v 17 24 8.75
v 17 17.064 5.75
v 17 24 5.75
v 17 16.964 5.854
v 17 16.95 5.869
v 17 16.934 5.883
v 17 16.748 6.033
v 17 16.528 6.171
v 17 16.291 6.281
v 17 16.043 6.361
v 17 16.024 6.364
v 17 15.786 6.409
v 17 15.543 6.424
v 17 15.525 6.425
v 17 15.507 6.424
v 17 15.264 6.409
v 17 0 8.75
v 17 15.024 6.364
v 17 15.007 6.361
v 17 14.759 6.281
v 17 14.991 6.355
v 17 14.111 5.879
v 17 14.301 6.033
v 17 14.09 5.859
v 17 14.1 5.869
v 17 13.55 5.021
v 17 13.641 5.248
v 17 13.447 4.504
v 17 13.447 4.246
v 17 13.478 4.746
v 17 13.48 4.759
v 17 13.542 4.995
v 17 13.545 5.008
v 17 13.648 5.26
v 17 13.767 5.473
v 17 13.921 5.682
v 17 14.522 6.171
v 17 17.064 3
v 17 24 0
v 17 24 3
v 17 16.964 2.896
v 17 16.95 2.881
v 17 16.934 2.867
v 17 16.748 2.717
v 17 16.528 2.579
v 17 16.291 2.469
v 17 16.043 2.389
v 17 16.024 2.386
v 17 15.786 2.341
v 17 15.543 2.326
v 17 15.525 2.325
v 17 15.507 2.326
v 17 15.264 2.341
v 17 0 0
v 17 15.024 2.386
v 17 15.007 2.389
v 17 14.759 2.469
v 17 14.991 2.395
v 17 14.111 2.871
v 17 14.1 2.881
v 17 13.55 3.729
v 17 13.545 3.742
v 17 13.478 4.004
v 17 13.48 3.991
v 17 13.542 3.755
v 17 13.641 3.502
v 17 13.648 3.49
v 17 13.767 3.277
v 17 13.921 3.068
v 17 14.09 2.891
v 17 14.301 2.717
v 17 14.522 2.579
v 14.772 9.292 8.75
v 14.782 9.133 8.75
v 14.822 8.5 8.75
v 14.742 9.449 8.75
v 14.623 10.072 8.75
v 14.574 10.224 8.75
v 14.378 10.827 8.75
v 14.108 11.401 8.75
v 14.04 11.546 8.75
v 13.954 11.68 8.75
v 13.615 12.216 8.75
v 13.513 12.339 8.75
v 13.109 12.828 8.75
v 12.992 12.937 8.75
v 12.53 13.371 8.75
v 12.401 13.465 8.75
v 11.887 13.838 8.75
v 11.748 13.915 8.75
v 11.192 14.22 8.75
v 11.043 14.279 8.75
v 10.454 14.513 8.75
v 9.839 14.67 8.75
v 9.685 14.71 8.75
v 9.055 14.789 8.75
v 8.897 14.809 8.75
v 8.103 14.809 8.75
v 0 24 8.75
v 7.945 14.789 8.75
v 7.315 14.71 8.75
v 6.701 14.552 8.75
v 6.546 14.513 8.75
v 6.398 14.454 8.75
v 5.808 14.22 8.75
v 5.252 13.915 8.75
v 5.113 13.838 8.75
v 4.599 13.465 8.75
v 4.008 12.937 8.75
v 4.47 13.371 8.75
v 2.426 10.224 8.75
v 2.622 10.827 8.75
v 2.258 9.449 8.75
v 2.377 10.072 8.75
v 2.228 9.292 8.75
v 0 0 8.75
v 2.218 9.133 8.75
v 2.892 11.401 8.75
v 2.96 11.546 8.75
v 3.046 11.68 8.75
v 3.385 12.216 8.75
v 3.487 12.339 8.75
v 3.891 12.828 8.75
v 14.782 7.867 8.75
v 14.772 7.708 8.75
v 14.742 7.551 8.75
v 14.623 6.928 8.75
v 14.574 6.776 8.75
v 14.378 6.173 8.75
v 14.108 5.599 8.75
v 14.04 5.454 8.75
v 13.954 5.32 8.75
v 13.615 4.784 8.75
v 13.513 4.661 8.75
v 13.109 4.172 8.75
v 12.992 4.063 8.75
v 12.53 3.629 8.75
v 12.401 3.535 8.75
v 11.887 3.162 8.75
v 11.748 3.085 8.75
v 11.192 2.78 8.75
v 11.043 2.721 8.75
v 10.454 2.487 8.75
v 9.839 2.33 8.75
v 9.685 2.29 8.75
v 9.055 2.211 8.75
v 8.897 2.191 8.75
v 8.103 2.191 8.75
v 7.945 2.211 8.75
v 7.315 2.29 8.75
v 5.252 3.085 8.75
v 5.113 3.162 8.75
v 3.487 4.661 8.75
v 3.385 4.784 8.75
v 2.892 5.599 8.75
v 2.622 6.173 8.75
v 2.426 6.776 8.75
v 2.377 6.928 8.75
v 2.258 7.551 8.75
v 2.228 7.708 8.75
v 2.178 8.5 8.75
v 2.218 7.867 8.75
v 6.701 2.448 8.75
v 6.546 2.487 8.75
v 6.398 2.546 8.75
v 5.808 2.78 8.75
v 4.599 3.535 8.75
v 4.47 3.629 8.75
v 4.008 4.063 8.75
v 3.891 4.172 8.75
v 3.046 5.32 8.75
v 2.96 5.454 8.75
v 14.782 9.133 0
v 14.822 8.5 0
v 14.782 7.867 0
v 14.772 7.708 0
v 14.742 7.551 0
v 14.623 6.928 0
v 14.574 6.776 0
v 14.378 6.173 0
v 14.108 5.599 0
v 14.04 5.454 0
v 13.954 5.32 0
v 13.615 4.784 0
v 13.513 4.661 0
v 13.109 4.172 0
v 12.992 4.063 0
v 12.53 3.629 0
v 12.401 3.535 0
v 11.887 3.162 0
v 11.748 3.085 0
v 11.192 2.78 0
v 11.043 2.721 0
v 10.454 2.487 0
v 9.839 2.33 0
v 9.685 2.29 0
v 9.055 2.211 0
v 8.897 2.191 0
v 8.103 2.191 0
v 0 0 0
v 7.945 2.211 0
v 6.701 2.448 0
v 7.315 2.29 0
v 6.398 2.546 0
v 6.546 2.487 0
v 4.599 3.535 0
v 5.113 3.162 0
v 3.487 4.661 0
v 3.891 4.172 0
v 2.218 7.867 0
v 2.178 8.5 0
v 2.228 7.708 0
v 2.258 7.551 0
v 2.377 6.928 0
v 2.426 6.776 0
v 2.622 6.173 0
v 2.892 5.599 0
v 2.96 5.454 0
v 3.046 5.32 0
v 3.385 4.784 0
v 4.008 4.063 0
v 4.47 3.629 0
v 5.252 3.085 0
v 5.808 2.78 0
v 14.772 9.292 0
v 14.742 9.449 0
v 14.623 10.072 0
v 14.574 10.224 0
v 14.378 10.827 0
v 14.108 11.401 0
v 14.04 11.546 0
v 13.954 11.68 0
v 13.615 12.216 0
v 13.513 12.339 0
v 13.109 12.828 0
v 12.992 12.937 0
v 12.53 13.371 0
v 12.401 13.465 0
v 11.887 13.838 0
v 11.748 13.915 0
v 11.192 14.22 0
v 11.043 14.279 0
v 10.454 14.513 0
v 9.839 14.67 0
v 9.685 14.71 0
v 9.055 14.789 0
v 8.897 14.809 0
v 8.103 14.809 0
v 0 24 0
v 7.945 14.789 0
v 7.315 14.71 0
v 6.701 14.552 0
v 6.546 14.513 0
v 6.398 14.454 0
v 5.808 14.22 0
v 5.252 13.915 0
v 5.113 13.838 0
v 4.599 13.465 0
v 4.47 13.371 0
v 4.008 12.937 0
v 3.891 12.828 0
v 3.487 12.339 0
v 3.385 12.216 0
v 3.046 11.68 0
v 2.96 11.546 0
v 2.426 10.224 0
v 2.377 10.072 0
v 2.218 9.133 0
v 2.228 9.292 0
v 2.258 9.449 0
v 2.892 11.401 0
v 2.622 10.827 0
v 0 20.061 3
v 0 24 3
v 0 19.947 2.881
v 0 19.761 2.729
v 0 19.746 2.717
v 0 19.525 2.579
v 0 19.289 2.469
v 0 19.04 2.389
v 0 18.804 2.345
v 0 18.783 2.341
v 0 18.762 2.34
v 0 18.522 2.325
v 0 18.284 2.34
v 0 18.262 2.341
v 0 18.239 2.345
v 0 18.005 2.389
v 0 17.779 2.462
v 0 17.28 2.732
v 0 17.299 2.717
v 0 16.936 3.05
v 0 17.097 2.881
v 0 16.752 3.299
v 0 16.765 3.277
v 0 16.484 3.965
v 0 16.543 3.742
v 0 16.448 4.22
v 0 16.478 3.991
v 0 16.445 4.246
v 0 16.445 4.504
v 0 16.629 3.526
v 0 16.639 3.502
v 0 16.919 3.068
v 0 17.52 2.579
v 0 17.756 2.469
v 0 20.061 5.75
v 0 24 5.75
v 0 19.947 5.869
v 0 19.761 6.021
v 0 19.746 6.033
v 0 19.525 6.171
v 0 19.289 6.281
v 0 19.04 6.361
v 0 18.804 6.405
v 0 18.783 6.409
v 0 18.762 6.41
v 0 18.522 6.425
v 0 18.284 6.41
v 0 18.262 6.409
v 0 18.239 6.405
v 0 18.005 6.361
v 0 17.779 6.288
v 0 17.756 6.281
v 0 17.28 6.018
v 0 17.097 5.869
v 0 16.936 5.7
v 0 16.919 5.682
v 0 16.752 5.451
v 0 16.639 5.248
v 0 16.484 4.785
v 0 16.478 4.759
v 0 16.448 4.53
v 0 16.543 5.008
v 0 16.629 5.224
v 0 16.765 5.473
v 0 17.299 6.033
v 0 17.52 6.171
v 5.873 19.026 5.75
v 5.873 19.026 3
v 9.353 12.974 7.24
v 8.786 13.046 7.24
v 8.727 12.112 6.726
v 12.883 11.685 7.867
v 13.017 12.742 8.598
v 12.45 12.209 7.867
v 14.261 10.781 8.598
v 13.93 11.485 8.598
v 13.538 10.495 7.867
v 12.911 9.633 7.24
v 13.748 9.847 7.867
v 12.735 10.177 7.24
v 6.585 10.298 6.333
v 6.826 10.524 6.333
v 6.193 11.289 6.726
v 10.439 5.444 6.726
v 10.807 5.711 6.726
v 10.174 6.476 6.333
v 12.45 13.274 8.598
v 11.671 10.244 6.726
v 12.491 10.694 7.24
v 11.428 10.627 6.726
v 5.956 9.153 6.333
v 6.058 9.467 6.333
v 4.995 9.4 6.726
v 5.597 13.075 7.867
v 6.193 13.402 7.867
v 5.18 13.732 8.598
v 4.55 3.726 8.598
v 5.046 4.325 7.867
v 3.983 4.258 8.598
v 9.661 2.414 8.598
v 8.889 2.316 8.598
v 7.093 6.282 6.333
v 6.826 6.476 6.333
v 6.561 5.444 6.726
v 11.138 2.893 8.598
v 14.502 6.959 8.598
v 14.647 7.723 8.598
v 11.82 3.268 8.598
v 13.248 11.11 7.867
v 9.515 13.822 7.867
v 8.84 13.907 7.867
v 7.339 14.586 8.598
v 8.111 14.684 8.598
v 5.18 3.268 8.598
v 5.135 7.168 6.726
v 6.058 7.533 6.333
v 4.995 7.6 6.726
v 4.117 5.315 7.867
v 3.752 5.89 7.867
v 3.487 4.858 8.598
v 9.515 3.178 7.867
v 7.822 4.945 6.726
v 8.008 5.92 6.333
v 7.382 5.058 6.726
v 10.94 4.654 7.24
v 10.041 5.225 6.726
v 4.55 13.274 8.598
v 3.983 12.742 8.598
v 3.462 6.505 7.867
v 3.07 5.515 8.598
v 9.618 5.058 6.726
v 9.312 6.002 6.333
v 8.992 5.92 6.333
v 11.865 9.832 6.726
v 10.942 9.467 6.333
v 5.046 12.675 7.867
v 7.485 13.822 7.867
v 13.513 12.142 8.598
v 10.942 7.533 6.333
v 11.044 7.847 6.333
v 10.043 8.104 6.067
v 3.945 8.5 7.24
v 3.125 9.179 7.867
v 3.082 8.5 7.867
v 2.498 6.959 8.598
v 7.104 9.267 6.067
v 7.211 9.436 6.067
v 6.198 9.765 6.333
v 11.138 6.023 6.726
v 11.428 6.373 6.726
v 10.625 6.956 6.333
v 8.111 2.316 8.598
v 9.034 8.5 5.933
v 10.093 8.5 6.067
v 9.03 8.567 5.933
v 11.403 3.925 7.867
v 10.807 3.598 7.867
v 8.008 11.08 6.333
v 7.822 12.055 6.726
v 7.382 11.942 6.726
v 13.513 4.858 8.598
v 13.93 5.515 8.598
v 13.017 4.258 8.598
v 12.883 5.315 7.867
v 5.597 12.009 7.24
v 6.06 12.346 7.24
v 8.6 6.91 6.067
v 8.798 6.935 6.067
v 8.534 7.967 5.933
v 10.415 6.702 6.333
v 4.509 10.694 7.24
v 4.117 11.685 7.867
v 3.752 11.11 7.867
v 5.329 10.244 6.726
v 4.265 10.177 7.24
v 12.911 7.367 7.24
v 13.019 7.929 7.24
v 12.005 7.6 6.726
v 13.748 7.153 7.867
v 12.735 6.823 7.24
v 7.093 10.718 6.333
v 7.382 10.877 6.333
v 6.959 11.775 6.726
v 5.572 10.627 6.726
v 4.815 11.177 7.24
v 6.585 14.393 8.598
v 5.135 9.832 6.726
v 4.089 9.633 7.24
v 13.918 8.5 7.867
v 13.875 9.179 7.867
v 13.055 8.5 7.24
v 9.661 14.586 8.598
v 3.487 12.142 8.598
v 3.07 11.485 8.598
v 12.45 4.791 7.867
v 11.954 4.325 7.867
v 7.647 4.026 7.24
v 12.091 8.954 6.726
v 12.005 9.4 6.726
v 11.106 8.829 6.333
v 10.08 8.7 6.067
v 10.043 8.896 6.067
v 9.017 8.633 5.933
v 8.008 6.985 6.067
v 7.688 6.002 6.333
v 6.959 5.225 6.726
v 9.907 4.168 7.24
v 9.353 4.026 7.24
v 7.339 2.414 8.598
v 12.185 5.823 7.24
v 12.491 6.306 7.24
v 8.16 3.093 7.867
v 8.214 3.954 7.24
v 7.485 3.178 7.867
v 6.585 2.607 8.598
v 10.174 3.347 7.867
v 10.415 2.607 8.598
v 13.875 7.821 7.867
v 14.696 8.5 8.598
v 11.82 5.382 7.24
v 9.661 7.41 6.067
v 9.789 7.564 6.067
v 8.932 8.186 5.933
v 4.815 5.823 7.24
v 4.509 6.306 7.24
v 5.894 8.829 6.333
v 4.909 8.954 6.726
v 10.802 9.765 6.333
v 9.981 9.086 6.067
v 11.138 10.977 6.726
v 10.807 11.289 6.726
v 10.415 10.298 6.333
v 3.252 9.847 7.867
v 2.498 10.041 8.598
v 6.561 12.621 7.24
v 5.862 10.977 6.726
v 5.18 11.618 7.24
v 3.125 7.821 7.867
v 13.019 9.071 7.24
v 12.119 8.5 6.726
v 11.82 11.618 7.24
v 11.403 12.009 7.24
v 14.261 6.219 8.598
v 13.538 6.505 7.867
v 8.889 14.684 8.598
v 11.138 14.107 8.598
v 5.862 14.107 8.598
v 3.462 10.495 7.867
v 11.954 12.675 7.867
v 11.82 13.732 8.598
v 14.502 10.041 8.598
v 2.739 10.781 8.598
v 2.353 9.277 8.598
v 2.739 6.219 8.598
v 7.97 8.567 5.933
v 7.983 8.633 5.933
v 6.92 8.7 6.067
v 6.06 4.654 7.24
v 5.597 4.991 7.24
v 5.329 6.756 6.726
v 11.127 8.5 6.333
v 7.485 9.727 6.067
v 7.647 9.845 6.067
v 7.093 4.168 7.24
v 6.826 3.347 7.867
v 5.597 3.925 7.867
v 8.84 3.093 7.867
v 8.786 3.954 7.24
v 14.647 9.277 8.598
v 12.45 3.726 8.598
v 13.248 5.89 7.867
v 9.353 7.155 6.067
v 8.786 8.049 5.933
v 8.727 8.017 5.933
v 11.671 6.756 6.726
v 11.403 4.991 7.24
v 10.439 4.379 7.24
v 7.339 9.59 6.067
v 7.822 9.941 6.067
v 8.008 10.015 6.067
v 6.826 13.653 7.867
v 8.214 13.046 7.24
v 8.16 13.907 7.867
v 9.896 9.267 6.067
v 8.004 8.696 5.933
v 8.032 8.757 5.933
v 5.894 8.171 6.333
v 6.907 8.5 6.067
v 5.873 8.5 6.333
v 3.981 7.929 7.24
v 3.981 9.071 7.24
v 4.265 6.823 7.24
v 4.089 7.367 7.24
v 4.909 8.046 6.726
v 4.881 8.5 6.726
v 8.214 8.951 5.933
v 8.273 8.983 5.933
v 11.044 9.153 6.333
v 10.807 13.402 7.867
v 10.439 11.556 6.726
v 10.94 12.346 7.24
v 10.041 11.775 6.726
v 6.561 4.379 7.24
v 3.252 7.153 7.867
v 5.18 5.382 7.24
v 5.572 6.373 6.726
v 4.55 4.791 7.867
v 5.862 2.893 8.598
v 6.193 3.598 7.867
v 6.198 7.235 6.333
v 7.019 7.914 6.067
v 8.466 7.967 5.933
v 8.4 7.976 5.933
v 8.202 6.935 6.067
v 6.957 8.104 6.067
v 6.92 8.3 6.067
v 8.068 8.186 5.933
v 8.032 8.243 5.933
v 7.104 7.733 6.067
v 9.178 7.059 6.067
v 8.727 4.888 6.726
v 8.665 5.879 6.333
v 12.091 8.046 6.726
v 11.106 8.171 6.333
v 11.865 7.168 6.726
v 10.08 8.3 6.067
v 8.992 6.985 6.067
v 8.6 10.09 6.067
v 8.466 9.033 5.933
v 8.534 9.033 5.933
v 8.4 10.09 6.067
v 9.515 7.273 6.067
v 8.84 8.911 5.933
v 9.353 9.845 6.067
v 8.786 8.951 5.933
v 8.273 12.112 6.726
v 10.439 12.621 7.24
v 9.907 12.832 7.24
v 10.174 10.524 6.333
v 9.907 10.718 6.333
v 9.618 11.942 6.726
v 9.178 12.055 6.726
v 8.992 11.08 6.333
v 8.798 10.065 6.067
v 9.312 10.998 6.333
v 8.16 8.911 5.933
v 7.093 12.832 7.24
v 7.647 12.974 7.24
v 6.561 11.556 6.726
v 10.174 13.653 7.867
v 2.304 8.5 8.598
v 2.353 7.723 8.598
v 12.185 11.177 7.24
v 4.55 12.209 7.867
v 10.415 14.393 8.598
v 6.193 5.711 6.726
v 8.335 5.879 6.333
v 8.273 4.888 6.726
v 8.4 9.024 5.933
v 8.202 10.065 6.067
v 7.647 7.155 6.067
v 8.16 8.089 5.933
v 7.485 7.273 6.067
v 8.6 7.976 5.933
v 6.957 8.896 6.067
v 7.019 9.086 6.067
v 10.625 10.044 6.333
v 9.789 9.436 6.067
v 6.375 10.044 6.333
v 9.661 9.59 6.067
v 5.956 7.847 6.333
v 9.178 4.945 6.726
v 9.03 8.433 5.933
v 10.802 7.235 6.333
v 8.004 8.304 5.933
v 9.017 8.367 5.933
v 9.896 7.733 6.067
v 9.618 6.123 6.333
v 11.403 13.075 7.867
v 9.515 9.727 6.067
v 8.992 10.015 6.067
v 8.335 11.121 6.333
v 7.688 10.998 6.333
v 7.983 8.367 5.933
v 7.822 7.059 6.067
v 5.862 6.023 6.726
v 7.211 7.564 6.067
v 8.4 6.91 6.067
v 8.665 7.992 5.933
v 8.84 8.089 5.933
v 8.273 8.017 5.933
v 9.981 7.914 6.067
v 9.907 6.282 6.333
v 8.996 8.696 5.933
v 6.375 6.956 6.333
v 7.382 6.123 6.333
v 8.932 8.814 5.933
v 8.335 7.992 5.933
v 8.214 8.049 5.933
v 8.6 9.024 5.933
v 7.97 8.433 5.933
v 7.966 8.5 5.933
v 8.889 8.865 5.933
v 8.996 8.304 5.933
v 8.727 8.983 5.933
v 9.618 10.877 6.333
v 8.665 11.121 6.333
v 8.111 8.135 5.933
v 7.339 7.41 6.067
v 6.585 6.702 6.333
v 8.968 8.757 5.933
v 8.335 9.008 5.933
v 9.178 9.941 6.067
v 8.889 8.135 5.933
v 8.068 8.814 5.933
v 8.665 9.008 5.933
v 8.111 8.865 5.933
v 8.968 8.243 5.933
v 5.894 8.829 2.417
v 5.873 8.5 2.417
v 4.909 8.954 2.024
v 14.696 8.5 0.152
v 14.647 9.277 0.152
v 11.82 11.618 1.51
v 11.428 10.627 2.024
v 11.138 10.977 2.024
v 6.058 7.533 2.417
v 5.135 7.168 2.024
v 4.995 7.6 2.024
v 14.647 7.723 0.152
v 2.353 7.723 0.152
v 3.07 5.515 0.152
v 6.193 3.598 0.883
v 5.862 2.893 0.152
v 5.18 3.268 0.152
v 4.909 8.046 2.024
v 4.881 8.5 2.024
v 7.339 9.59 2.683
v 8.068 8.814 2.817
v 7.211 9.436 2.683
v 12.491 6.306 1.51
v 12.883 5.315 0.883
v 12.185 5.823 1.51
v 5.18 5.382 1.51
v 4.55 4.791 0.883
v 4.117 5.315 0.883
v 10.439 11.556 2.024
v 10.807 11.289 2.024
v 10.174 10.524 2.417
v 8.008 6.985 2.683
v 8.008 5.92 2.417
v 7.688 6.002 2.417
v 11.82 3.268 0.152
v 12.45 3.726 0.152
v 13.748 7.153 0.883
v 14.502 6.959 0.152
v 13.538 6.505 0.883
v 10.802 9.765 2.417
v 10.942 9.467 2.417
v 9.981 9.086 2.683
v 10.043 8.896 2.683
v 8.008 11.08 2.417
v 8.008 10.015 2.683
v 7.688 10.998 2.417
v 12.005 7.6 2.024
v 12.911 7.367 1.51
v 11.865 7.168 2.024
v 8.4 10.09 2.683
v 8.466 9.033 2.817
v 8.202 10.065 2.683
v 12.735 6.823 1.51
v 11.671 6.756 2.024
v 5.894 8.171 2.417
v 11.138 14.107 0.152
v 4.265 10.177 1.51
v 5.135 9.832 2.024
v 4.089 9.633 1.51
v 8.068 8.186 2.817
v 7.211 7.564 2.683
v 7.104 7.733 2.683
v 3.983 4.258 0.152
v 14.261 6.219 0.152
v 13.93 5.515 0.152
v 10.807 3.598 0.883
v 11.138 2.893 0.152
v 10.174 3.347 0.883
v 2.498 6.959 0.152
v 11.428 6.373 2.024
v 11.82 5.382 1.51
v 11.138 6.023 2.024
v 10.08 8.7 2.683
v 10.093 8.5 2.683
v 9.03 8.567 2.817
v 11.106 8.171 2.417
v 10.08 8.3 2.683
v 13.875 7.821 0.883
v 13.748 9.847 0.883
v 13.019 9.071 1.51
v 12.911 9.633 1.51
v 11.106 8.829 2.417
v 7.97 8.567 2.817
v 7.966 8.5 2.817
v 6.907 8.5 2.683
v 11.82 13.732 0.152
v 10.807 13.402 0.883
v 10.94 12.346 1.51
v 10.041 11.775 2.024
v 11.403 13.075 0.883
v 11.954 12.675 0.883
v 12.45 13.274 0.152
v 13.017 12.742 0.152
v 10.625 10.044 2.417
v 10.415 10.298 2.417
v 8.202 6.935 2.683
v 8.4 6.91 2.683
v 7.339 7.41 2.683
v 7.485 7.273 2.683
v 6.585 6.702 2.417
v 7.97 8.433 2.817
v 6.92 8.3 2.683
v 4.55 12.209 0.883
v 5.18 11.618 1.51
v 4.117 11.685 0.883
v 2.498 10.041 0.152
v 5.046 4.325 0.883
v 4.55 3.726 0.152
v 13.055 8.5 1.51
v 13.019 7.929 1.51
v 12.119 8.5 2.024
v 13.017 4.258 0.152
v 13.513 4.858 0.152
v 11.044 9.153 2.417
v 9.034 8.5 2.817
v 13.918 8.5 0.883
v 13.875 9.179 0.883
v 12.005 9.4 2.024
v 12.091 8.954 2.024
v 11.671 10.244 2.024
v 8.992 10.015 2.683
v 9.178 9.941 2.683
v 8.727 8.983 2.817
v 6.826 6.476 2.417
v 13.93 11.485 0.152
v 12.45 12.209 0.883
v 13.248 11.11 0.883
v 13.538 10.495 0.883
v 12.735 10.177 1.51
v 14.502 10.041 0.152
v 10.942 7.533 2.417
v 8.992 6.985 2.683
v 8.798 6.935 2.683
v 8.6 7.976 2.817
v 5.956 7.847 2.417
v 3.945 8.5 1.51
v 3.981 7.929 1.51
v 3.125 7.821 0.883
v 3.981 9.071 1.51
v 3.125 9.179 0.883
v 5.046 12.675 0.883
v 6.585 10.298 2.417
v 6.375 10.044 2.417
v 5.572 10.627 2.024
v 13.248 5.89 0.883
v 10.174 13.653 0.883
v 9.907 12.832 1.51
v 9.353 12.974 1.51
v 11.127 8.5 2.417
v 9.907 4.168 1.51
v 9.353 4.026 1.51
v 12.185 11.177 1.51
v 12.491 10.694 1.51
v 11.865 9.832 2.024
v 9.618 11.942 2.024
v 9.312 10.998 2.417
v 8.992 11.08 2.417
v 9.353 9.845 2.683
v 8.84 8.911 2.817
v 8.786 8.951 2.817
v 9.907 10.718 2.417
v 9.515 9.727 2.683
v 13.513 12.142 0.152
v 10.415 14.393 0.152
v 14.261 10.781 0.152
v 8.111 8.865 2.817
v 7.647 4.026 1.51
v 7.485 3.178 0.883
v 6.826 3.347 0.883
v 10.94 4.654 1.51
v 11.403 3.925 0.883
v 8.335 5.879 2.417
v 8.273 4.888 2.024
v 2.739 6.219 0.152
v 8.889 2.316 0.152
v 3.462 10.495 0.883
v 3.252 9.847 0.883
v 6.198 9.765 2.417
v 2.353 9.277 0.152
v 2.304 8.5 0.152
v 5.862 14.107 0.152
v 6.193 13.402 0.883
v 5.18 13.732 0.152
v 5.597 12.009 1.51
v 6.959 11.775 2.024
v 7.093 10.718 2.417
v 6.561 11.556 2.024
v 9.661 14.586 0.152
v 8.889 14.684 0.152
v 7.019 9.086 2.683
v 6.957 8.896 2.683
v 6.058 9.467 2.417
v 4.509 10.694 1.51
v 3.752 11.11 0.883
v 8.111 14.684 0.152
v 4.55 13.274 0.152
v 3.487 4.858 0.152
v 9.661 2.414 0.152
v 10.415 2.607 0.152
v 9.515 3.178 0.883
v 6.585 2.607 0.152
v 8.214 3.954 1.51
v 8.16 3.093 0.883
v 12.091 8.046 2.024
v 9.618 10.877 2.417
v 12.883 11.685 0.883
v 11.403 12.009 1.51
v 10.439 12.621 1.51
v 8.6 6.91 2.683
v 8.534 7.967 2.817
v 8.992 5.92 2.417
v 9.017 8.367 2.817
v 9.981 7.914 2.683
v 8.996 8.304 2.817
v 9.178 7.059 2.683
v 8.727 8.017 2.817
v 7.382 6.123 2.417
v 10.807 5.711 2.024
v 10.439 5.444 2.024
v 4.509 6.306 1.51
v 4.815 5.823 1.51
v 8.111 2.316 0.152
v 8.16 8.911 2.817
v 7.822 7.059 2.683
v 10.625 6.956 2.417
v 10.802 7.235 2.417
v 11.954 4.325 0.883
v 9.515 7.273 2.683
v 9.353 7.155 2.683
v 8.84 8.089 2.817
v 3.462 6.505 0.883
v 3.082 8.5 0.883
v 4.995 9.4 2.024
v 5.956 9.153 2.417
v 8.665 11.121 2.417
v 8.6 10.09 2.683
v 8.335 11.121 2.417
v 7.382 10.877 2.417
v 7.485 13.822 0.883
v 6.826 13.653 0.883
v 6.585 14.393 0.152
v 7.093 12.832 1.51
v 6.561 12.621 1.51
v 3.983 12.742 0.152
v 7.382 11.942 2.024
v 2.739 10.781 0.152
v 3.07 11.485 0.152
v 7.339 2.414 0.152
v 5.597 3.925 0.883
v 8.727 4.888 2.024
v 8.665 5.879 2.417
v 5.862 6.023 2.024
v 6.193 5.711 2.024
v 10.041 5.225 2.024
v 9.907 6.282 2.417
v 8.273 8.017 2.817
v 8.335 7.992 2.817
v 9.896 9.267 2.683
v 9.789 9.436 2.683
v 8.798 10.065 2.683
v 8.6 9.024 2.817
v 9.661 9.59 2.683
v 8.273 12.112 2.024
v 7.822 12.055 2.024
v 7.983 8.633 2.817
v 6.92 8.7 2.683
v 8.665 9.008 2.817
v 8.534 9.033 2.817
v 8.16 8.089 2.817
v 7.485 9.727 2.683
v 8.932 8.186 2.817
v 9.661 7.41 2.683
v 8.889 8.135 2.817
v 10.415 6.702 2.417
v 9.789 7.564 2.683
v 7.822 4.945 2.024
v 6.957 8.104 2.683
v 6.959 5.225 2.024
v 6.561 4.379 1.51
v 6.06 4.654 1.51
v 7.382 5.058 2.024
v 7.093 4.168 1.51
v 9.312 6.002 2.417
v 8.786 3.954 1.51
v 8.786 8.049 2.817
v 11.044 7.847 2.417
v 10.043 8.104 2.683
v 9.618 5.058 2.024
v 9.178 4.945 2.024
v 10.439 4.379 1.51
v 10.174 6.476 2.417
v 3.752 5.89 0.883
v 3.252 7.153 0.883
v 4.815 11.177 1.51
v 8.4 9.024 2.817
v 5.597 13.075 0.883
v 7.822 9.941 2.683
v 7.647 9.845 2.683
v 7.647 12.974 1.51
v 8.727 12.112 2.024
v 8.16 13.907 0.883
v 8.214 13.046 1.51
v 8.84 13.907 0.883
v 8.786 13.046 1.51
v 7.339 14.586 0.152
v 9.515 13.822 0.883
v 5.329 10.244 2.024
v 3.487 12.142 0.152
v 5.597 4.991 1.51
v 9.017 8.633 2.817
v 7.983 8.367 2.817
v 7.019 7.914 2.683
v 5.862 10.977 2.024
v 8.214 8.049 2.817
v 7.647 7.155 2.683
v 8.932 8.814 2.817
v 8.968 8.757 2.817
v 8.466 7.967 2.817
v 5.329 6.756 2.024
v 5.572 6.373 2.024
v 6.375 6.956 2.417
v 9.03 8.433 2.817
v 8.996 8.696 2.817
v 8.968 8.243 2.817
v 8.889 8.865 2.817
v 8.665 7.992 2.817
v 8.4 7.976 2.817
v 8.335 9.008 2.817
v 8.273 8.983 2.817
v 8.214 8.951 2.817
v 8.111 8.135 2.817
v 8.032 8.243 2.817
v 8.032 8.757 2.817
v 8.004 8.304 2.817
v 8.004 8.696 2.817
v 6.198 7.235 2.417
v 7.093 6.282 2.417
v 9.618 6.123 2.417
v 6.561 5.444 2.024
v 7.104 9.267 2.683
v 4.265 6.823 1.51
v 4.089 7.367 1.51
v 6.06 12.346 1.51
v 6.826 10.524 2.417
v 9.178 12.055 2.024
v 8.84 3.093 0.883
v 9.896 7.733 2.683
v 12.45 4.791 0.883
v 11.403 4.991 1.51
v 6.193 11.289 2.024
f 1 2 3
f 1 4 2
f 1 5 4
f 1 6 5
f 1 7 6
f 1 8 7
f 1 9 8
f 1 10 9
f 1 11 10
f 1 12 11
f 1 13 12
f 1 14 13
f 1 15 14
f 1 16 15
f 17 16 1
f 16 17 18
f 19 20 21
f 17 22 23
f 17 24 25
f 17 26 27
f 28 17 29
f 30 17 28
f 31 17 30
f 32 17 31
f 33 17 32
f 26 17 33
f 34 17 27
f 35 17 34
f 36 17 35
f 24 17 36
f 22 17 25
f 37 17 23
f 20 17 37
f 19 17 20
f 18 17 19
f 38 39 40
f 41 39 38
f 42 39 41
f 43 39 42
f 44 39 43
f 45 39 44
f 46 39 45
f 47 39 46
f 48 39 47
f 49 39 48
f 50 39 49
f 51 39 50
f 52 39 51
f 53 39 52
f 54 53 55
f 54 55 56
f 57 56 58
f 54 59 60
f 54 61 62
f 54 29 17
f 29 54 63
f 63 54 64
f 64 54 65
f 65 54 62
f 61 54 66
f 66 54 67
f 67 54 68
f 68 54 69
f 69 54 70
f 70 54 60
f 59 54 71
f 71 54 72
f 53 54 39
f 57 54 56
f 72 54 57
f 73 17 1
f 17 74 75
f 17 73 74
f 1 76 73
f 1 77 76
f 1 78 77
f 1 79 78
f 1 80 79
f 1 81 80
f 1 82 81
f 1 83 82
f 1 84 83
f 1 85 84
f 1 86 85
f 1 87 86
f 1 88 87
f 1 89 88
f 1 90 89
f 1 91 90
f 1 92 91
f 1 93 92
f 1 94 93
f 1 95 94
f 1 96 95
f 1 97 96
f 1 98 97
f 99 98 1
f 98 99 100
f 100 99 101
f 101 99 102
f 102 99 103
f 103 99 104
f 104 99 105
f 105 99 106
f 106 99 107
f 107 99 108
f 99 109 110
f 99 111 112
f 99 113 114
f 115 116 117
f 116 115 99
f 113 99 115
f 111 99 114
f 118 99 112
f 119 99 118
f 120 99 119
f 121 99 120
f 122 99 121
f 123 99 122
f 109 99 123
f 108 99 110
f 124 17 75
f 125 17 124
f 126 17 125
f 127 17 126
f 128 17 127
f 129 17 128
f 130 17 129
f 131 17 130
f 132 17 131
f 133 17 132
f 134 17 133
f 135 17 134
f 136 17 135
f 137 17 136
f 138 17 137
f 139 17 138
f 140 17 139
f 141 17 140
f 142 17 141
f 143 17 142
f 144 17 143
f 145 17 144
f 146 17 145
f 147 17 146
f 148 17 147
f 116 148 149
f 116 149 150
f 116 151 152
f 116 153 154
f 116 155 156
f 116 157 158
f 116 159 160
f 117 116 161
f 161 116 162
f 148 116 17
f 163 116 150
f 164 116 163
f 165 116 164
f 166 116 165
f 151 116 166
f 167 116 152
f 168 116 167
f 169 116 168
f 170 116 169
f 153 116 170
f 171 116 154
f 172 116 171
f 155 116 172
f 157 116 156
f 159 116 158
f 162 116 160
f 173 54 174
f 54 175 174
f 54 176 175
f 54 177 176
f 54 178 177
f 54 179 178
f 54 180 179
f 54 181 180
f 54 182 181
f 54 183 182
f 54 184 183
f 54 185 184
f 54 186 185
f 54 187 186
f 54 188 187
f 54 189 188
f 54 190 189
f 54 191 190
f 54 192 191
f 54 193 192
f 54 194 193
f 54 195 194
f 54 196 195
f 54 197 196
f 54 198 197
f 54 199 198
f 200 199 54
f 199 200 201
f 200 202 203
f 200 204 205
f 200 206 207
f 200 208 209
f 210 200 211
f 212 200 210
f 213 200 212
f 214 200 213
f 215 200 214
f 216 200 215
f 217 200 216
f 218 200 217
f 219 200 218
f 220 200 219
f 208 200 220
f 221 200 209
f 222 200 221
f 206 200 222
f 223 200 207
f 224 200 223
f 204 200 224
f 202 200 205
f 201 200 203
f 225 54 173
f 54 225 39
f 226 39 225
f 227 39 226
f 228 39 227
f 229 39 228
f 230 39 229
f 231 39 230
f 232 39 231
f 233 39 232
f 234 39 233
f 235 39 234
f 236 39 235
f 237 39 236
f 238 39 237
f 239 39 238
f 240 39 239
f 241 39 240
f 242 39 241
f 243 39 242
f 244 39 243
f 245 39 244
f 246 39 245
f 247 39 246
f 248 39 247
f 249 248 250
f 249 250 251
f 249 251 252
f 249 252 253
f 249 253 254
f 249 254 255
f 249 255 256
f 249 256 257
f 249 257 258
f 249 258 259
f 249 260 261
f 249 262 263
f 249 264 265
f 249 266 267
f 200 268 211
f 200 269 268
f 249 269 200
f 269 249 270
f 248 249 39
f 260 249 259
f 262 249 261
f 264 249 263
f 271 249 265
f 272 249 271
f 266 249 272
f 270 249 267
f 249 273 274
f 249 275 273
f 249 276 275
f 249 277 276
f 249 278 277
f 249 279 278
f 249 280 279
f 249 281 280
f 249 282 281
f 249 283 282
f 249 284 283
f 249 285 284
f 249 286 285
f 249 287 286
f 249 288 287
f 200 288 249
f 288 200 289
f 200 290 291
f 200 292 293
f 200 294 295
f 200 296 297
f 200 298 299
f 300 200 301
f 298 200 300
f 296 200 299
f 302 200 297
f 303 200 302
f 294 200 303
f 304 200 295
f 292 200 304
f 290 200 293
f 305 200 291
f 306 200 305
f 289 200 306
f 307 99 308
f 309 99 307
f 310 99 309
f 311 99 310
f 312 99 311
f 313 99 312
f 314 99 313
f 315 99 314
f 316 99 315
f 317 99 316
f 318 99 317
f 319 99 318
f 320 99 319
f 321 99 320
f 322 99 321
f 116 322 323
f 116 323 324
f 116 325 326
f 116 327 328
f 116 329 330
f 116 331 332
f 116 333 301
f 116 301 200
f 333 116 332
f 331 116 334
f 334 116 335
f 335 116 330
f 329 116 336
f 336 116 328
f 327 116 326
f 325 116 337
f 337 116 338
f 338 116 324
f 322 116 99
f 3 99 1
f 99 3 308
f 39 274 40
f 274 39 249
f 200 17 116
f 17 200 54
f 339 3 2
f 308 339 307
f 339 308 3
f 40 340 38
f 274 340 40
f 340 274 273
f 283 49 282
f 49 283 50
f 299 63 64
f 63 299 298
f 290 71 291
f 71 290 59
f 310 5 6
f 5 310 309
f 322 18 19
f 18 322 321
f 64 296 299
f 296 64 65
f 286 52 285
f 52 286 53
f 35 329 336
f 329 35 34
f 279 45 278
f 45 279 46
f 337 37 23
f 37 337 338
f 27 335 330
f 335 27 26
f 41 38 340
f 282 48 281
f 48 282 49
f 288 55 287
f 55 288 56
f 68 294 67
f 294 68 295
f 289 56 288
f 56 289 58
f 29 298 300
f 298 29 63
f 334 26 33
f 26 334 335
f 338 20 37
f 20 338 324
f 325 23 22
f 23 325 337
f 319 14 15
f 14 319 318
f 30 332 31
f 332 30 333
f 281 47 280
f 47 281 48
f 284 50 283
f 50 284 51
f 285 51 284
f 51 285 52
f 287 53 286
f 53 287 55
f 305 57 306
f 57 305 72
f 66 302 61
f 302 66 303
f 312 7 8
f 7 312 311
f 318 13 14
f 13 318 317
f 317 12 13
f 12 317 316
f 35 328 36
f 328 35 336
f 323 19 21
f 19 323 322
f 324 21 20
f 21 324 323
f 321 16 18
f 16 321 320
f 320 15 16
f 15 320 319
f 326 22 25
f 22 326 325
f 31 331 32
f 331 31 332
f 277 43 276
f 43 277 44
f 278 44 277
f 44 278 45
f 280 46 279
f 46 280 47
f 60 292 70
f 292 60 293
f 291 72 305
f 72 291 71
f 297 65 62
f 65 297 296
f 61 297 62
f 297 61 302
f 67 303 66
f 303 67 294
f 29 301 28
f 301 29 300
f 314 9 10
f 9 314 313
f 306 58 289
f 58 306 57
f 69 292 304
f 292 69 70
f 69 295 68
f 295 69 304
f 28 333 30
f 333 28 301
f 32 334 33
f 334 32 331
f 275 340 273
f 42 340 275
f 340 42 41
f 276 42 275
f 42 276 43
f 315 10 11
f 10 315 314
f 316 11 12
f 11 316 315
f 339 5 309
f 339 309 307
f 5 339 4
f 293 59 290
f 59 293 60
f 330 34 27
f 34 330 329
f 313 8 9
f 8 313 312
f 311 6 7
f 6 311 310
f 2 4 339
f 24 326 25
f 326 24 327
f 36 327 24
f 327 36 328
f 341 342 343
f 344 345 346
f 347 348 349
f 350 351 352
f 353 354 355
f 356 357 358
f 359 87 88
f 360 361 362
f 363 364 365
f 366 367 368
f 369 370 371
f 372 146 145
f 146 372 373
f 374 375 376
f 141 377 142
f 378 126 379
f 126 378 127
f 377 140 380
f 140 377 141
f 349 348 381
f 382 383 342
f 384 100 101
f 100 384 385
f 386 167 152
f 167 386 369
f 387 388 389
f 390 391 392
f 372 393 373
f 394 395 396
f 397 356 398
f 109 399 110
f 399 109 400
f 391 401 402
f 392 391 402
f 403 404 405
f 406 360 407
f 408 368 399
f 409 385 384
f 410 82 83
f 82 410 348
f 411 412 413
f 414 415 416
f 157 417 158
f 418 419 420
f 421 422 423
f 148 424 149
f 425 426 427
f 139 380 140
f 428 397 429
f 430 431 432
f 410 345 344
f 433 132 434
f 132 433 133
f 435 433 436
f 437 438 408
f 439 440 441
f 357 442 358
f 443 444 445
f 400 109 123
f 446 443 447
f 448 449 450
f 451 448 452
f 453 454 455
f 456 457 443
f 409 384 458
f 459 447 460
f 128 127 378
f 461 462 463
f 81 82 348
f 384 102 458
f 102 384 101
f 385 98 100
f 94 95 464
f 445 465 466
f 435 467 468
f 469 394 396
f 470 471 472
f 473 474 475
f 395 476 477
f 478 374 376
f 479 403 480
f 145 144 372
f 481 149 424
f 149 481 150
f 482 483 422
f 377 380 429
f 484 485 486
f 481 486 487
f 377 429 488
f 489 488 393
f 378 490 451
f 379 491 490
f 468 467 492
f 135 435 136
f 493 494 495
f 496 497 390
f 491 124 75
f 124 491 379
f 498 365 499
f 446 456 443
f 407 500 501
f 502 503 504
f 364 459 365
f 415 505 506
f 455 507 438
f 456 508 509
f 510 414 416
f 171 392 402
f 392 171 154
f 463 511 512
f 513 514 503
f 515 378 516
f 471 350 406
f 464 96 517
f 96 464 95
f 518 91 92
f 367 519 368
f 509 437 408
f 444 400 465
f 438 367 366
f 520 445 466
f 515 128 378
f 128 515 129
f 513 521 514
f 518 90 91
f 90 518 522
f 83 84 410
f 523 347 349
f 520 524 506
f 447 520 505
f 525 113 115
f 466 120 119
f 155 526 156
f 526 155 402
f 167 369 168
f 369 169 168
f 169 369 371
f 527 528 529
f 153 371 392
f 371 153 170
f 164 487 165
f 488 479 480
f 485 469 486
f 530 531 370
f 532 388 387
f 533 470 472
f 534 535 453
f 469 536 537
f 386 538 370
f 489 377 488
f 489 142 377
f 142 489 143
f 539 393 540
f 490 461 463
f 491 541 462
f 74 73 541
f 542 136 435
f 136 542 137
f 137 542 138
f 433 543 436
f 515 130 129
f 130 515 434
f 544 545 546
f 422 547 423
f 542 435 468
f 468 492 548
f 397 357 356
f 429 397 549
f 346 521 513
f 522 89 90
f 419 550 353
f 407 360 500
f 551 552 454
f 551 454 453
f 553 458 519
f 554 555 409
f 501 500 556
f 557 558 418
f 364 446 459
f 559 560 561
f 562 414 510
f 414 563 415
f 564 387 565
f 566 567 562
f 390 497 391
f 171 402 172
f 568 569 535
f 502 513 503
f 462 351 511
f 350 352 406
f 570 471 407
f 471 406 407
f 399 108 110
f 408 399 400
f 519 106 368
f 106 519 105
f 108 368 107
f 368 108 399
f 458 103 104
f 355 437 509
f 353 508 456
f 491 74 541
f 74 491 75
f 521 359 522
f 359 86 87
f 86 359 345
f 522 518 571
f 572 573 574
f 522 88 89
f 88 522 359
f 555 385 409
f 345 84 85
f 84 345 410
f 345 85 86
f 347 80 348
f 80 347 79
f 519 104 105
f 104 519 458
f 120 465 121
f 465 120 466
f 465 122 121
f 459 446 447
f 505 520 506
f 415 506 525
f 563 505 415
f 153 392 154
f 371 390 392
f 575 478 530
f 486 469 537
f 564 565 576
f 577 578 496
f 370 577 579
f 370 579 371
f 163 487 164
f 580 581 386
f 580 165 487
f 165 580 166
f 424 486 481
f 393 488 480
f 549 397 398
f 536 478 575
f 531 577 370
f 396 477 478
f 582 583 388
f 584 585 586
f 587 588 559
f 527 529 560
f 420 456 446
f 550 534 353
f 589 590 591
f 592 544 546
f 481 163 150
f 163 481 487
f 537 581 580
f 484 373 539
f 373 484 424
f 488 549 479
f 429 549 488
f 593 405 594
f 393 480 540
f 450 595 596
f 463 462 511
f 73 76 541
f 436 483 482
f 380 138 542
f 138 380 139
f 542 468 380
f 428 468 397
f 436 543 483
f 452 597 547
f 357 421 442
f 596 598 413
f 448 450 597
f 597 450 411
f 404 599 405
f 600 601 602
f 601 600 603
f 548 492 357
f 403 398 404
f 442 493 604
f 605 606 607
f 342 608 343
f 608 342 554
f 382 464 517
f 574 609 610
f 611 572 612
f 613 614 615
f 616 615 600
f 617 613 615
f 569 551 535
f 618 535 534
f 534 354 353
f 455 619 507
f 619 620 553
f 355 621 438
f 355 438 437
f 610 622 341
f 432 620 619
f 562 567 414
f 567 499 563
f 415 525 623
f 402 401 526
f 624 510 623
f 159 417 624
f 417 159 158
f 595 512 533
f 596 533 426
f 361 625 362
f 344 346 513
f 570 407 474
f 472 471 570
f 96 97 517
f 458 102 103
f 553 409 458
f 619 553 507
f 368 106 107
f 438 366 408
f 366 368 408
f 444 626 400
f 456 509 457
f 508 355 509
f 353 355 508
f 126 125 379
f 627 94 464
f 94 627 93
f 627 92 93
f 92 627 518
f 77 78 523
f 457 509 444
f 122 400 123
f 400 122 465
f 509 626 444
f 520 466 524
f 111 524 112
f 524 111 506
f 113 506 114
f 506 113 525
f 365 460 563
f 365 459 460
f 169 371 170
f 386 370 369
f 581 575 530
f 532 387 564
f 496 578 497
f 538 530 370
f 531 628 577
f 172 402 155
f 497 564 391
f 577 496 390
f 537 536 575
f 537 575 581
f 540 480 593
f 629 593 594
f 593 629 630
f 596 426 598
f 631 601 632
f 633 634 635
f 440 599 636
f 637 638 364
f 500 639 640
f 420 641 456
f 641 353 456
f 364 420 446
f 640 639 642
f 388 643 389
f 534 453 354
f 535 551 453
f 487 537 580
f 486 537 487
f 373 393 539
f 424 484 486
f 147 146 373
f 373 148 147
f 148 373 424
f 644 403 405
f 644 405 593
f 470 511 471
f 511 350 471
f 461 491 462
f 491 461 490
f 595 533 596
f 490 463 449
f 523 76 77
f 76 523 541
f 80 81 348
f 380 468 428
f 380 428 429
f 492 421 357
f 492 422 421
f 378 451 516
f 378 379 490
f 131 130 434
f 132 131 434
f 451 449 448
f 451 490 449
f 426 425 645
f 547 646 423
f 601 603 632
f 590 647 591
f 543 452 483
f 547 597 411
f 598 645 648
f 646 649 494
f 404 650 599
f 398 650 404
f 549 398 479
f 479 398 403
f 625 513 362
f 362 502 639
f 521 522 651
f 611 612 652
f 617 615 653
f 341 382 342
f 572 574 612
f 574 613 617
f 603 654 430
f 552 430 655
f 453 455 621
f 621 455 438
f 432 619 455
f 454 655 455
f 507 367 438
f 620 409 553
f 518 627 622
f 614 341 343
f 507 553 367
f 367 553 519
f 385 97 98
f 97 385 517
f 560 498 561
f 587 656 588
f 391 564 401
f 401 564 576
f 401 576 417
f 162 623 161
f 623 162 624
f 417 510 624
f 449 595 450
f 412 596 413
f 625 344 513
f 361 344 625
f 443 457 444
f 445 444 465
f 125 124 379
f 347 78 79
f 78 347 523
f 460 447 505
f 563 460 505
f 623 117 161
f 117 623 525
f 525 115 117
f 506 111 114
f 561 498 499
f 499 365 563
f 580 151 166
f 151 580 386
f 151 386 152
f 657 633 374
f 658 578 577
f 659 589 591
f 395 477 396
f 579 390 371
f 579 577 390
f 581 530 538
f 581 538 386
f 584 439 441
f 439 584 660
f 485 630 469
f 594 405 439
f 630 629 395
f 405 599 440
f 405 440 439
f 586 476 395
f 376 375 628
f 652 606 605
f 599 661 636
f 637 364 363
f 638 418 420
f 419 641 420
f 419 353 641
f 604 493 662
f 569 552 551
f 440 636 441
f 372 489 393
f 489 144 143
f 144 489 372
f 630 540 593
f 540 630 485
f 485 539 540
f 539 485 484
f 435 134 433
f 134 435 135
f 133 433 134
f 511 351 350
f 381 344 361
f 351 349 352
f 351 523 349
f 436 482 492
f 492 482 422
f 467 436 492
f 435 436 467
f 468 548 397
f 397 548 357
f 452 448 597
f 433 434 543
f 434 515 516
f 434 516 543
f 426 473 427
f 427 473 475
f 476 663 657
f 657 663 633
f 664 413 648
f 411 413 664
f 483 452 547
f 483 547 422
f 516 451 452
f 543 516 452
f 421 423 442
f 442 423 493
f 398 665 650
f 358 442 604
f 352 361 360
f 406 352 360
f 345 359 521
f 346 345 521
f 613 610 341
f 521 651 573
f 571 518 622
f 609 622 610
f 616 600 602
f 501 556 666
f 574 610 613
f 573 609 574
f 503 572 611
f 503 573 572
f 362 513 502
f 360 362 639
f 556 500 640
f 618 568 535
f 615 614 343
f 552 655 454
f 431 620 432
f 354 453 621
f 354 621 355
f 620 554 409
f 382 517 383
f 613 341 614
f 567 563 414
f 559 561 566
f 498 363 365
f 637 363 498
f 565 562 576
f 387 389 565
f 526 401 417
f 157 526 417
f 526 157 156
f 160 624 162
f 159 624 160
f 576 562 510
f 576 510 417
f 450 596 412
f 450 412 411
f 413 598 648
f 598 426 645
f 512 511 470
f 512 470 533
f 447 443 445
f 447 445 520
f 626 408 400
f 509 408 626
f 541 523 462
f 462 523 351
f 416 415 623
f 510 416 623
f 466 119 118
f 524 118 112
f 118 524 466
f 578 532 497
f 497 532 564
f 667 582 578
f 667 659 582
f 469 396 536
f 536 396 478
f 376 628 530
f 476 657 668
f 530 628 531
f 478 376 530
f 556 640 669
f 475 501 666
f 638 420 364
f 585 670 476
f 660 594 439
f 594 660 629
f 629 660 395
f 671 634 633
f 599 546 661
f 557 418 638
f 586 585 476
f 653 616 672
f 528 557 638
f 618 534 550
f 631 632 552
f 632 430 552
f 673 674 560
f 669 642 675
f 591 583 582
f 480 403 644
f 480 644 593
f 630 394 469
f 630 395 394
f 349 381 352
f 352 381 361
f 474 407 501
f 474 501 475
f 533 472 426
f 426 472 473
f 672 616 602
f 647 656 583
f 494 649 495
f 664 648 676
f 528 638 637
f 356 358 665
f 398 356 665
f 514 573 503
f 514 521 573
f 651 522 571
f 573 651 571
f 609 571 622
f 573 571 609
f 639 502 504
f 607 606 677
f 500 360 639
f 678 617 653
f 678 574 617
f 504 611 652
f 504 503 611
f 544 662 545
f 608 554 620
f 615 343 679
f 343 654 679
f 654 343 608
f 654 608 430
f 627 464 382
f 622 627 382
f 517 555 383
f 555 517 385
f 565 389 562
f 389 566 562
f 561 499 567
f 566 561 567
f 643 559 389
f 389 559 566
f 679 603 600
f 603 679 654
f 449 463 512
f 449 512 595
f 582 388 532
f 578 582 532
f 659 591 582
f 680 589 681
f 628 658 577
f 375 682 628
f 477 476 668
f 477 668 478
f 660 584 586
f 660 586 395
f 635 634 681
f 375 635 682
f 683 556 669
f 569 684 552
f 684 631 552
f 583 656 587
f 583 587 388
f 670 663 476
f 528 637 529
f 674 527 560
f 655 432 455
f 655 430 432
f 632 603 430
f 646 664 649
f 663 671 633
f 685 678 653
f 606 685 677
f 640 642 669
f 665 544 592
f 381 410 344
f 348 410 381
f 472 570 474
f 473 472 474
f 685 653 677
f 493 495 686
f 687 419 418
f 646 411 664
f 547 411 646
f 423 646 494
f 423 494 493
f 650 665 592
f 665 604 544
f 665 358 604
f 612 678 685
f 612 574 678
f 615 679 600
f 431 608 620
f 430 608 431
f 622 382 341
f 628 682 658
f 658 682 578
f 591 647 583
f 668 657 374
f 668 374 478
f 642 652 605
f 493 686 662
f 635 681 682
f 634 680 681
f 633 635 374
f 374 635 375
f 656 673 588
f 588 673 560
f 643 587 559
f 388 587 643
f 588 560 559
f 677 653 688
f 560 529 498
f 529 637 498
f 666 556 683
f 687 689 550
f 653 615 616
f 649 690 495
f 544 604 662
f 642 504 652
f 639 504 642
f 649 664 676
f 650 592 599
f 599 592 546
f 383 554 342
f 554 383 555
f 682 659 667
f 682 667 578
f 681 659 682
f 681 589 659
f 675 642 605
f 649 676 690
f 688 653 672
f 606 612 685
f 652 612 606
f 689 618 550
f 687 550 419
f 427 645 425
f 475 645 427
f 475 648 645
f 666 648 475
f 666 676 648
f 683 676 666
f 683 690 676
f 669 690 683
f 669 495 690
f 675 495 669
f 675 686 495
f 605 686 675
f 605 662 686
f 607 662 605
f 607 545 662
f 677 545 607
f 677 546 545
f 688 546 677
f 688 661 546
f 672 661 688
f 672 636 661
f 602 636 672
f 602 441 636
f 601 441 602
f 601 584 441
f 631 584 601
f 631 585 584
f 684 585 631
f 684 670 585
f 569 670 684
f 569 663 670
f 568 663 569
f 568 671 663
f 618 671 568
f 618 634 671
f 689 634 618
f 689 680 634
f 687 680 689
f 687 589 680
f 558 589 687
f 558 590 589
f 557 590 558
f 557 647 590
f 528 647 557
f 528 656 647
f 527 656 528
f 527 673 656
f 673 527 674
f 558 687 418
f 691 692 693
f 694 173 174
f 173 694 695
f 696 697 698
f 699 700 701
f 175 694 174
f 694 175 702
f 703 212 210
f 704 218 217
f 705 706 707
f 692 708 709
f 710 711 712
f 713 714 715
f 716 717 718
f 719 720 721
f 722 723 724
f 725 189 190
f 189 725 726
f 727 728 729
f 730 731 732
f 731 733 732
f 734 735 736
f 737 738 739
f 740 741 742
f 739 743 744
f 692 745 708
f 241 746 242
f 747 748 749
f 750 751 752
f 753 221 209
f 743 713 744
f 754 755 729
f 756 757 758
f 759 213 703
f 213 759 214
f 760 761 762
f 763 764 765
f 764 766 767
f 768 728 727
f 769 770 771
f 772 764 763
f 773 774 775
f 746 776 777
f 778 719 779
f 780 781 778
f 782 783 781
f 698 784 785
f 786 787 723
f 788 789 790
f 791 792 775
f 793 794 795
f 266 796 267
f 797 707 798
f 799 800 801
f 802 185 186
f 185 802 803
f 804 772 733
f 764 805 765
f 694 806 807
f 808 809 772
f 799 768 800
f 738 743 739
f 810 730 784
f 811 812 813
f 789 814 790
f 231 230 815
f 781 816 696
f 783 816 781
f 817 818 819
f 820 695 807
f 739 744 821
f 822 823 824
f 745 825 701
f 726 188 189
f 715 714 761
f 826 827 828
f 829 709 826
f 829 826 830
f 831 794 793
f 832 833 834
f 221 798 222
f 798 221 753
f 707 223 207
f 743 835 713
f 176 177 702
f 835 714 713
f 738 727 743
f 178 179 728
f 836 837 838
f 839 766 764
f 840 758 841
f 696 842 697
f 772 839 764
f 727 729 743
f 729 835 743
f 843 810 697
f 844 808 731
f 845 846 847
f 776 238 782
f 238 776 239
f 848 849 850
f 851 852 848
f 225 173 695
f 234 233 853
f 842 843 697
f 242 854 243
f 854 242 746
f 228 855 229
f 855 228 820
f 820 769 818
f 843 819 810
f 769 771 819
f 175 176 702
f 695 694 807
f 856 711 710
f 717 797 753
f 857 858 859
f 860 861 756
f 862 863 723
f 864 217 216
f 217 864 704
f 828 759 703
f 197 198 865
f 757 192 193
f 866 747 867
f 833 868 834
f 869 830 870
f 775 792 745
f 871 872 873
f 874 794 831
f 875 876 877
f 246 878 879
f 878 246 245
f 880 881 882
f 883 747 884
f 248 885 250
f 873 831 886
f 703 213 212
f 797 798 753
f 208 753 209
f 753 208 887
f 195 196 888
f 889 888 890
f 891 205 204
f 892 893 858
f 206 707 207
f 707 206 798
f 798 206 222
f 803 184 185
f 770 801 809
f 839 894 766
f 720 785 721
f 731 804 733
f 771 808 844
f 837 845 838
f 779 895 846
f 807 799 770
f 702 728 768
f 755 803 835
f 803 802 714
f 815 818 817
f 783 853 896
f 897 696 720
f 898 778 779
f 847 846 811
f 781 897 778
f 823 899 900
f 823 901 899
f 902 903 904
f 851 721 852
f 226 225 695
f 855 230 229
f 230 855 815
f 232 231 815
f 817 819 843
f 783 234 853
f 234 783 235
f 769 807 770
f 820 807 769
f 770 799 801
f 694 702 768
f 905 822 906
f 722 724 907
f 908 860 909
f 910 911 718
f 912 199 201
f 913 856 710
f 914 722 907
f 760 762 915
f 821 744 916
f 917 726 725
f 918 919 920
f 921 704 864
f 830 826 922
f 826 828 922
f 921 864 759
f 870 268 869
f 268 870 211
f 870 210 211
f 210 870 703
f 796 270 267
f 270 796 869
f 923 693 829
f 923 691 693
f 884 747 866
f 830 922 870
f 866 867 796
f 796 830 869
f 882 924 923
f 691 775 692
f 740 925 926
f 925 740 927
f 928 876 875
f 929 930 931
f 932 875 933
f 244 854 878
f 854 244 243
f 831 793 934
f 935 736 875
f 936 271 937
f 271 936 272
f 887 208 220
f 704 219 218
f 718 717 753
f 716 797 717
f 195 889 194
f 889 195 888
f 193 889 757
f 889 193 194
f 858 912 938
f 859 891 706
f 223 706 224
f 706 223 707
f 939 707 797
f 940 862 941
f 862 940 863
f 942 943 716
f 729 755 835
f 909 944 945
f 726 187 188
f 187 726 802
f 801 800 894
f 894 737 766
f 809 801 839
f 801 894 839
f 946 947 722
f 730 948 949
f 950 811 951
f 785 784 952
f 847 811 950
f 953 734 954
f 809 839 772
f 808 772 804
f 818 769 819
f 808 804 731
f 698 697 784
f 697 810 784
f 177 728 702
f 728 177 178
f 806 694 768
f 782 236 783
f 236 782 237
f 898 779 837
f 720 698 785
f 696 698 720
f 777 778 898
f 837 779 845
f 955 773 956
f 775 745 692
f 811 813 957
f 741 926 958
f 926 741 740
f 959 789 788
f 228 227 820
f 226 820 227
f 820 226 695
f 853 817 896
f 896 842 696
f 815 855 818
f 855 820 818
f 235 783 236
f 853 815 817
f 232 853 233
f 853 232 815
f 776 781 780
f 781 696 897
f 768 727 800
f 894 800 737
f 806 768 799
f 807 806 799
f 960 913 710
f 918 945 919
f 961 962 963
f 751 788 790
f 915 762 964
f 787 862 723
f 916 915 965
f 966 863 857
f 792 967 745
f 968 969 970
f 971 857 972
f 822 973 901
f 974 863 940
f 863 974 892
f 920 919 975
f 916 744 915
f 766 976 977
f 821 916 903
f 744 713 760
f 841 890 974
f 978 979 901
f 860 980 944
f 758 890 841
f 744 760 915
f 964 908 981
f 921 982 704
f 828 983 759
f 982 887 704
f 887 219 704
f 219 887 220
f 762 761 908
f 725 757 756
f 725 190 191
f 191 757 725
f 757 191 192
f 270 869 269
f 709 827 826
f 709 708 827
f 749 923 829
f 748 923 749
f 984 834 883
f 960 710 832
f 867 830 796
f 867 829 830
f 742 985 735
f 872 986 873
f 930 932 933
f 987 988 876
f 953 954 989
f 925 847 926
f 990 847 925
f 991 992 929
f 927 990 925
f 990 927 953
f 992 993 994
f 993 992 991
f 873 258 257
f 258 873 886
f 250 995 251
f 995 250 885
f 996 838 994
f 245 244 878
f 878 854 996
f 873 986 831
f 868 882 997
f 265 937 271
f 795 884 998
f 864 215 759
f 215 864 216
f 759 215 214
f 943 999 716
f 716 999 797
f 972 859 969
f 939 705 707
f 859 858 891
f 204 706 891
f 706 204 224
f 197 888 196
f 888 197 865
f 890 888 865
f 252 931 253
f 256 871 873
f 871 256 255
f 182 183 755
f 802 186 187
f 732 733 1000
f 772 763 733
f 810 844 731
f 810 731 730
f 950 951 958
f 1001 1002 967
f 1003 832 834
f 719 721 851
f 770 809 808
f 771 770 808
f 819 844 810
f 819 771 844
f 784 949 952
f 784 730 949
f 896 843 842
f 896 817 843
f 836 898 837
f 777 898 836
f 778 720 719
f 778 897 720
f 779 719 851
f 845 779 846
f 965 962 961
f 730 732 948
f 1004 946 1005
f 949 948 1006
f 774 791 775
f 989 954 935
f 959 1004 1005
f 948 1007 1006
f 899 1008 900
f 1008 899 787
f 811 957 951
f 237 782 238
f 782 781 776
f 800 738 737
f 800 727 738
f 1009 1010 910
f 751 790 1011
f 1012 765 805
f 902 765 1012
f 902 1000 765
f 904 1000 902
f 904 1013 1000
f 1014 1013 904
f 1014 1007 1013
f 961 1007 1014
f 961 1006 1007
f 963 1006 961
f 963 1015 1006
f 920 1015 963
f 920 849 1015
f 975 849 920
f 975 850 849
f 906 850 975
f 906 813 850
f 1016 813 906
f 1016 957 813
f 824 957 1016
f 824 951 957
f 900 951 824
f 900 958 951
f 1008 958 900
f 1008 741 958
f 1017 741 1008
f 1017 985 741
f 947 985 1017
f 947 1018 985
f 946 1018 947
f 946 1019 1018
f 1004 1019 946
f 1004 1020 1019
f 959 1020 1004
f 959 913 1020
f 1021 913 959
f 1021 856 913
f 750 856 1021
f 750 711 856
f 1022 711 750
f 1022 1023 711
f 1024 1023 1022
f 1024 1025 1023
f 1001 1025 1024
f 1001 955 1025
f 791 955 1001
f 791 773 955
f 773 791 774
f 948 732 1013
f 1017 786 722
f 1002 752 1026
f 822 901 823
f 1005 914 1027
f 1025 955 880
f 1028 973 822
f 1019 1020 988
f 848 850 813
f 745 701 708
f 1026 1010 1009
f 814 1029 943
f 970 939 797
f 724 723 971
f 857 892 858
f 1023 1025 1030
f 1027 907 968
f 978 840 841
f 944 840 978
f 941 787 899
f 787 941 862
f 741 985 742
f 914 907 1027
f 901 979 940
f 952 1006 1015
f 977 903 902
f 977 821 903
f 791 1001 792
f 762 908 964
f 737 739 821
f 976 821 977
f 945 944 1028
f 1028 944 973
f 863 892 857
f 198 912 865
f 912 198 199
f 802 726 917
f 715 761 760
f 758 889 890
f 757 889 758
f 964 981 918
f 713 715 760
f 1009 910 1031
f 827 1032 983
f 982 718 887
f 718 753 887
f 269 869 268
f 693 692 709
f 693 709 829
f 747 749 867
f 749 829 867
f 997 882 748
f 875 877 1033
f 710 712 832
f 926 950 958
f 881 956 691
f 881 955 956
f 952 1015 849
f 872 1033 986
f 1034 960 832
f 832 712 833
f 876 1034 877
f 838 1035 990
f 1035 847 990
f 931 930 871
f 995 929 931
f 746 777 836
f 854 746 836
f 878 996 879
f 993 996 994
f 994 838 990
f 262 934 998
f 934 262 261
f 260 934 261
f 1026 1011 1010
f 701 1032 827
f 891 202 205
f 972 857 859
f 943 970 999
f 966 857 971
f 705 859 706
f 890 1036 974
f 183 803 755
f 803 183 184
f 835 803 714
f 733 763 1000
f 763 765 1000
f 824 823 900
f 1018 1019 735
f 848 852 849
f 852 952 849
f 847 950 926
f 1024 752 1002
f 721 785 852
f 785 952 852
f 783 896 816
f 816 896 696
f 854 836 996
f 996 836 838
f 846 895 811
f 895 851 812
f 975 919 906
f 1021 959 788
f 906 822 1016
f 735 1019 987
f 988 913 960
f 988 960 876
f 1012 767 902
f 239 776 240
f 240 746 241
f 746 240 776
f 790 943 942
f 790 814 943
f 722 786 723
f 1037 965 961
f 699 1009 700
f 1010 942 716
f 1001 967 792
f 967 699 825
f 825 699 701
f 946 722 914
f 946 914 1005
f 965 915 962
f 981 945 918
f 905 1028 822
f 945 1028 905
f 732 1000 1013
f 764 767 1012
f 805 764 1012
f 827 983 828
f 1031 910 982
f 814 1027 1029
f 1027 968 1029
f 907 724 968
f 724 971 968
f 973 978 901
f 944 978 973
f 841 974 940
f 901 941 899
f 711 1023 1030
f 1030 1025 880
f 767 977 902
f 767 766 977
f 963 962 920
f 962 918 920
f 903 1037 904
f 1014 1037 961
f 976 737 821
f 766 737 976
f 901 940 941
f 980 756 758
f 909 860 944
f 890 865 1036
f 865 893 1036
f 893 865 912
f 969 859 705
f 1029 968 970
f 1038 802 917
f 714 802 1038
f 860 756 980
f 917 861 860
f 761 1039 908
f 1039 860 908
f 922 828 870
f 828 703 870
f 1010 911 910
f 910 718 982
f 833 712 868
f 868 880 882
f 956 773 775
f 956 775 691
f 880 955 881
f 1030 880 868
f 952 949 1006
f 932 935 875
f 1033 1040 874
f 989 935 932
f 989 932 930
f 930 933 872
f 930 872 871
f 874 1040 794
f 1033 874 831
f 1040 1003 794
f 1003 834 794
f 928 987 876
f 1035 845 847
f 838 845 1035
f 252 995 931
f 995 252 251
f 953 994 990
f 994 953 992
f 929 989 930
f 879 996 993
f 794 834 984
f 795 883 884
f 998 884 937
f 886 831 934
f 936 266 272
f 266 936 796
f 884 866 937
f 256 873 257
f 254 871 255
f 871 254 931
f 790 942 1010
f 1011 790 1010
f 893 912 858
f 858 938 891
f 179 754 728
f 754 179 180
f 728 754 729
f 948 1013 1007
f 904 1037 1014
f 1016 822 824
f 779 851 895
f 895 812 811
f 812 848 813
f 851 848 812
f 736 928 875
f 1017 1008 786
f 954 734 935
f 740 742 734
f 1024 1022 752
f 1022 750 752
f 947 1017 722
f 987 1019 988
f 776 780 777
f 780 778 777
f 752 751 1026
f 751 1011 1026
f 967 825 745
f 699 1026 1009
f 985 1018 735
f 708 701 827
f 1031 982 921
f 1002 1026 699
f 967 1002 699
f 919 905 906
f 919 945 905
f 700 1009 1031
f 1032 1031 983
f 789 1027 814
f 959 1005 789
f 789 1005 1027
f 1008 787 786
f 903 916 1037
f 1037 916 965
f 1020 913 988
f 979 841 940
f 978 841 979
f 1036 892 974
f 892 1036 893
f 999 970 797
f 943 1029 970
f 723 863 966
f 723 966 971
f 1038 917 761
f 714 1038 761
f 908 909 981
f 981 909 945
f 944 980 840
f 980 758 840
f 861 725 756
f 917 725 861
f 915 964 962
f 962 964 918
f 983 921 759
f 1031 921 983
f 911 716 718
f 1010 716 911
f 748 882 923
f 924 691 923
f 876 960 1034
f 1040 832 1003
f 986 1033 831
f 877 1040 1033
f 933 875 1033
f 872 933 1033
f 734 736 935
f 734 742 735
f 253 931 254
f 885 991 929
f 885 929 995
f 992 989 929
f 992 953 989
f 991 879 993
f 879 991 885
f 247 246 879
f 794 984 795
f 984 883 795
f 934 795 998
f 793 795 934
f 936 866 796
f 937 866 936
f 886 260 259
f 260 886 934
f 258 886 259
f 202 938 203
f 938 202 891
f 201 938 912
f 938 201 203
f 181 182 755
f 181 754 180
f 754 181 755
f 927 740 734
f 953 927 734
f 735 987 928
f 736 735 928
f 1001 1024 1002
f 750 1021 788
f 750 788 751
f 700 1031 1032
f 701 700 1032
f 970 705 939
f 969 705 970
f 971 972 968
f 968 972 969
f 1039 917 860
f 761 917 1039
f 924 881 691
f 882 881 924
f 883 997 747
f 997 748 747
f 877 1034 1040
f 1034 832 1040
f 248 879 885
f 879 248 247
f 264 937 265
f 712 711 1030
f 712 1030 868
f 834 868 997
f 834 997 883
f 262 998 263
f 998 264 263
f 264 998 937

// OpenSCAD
$fn=50;
gap=2.75;
cage=4.1;
slotDepth=7;
length=17;
wall=3;
angle=10;

difference(){
    cube([length,length+slotDepth,(wall*2)+gap]);
    //access slot
    #translate([0,length,wall]) 
        cube([length,slotDepth,gap]);
    //top cage cutout
    #translate([-length*.1,length+cage/2.25,wall+gap/2]) rotate([angle,90,0])
        cylinder(d=cage,length*1.2);
    //top thumb grip
    #translate([length/2,length/2,2*wall+gap+length/3])
        sphere(d = length);
    //botton thumb grip
    #translate([length/2,length/2,-length/3])
        sphere(d = length);
}
